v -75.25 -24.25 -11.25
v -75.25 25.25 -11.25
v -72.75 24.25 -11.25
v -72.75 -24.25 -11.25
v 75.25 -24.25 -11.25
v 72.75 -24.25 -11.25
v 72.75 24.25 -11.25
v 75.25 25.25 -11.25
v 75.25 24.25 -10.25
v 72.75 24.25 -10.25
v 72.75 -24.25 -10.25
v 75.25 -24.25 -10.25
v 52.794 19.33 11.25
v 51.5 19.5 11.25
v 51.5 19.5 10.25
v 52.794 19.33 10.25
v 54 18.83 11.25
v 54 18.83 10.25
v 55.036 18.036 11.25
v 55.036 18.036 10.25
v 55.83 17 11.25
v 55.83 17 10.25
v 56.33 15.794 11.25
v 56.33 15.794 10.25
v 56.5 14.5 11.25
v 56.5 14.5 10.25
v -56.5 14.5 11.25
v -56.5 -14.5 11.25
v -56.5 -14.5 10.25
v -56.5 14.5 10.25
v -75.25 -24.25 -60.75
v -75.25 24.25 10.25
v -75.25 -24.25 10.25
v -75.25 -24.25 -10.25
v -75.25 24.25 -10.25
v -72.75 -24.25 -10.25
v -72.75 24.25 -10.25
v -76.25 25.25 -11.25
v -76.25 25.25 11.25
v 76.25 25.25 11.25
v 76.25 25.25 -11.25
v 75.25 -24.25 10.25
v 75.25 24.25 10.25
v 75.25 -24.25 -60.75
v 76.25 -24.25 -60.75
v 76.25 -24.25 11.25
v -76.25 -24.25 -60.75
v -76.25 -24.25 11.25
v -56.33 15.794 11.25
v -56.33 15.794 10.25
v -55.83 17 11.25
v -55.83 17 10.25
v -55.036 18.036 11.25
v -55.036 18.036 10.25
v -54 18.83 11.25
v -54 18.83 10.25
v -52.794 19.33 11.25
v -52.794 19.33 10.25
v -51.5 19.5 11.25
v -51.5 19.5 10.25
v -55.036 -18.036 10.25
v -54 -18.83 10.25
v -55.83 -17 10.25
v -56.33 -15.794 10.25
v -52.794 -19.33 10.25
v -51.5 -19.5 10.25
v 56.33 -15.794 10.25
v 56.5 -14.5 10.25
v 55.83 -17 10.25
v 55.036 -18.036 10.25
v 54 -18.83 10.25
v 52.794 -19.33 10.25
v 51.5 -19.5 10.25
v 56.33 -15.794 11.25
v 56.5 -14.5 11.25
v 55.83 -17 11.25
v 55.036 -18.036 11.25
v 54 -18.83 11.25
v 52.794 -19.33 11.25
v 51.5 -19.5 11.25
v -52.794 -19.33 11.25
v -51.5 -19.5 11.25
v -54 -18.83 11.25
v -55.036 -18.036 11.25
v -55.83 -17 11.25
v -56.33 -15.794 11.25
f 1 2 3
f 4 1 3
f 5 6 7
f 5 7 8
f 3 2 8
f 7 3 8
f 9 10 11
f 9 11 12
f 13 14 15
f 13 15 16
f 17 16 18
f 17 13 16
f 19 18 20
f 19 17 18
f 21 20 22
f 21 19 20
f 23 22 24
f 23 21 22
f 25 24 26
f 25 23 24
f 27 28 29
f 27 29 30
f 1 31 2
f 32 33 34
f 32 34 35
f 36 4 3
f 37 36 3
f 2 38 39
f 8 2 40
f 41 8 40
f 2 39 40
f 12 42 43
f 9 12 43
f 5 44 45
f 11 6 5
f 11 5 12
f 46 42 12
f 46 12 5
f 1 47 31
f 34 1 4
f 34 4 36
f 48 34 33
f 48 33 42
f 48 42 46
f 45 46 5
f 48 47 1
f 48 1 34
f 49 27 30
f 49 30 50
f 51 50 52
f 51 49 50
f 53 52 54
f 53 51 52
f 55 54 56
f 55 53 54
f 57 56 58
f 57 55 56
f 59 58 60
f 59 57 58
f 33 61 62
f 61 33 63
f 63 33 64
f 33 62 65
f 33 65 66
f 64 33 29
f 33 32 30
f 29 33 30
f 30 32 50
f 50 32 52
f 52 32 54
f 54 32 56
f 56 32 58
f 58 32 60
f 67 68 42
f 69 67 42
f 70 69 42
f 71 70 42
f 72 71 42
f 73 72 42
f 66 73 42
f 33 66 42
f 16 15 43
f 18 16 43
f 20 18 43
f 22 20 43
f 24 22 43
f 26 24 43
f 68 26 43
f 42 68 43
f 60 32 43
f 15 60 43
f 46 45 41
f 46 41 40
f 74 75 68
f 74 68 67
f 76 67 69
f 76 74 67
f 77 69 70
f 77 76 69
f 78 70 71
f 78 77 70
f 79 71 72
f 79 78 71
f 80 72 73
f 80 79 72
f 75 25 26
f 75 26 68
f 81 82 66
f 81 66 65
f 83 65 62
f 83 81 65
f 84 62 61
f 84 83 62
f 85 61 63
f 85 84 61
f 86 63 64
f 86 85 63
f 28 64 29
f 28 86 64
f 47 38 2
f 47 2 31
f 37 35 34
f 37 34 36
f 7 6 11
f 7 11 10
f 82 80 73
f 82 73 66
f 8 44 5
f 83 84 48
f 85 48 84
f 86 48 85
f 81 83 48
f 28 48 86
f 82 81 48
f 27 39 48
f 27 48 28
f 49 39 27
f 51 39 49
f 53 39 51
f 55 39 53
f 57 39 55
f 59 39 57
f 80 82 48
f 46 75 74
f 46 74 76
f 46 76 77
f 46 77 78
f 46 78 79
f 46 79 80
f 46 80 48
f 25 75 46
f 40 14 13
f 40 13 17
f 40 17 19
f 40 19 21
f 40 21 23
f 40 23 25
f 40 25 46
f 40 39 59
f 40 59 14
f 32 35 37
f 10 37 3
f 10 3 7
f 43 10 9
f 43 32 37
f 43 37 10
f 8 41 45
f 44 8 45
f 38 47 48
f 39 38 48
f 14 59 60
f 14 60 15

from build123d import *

# Parameters (mm, degrees)
SKETCH1_W           = 150.5
SKETCH1_H           = 48.5
BOSS_EXTRUDE1_DEPTH = 10.25
SHELL1_T            = 1
SKETCH2_W           = 145.5
SKETCH2_H           = 48.5
CUT_EXTRUDE1_DEPTH  = 1
CUT_EXTRUDE2_DEPTH  = 1
BOSS_EXTRUDE2_DEPTH = 1


with BuildPart() as part:
    # Sketch1 → Boss-Extrude1 (new, symmetric)
    with BuildSketch(Plane.XY):
        Rectangle(SKETCH1_W, SKETCH1_H)
    extrude(amount=BOSS_EXTRUDE1_DEPTH, both=True)

    # Shell1
    shell1_openings = [part.faces().sort_by_distance(p)[0] for p in [
        (0, -24.25, 0),
    ]]
    offset(amount=SHELL1_T, openings=shell1_openings, kind=Kind.INTERSECTION)

    # Sketch2 → Cut-Extrude1 (cut)
    with BuildSketch(Plane(origin=(0, 0, -11.25), x_dir=(-1, 0, 0), z_dir=(0, 0, -1))):
        Rectangle(SKETCH2_W, SKETCH2_H)
    extrude(amount=-CUT_EXTRUDE1_DEPTH, mode=Mode.SUBTRACT)

    # Sketch3 → Cut-Extrude2 (cut)
    with BuildSketch(Plane.XY.offset(11.25)):
        with BuildLine():
            Line((51.5, -19.5), (-51.5, -19.5))
            ThreePointArc((-51.5, -19.5), (-55.035533906, -18.035533906), (-56.5, -14.5))
            Line((-56.5, -14.5), (-56.5, 14.5))
            ThreePointArc((-56.5, 14.5), (-55.035533906, 18.035533906), (-51.5, 19.5))
            Line((-51.5, 19.5), (51.5, 19.5))
            ThreePointArc((51.5, 19.5), (55.035533906, 18.035533906), (56.5, 14.5))
            Line((56.5, 14.5), (56.5, -14.5))
            ThreePointArc((56.5, -14.5), (55.035533906, -18.035533906), (51.5, -19.5))
        make_face()
    extrude(amount=-CUT_EXTRUDE2_DEPTH, mode=Mode.SUBTRACT)

    # Sketch4 → Boss-Extrude2 (add)
    with BuildSketch(Plane(origin=(76.25, 0, 0), x_dir=(0, 0, -1), z_dir=(1, 0, 0))):
        Polygon((11.25, 25.25), (60.75, -24.25), (11.25, -24.25), align=None)
    boss_extrude2 = extrude(amount=-BOSS_EXTRUDE2_DEPTH)

    # Mirror1: Boss-Extrude2 across plane
    add(boss_extrude2.mirror(Plane(origin=(0, 0, 0), x_dir=(0, 0, 1), z_dir=(1, 0, 0))))


solid = part.part
